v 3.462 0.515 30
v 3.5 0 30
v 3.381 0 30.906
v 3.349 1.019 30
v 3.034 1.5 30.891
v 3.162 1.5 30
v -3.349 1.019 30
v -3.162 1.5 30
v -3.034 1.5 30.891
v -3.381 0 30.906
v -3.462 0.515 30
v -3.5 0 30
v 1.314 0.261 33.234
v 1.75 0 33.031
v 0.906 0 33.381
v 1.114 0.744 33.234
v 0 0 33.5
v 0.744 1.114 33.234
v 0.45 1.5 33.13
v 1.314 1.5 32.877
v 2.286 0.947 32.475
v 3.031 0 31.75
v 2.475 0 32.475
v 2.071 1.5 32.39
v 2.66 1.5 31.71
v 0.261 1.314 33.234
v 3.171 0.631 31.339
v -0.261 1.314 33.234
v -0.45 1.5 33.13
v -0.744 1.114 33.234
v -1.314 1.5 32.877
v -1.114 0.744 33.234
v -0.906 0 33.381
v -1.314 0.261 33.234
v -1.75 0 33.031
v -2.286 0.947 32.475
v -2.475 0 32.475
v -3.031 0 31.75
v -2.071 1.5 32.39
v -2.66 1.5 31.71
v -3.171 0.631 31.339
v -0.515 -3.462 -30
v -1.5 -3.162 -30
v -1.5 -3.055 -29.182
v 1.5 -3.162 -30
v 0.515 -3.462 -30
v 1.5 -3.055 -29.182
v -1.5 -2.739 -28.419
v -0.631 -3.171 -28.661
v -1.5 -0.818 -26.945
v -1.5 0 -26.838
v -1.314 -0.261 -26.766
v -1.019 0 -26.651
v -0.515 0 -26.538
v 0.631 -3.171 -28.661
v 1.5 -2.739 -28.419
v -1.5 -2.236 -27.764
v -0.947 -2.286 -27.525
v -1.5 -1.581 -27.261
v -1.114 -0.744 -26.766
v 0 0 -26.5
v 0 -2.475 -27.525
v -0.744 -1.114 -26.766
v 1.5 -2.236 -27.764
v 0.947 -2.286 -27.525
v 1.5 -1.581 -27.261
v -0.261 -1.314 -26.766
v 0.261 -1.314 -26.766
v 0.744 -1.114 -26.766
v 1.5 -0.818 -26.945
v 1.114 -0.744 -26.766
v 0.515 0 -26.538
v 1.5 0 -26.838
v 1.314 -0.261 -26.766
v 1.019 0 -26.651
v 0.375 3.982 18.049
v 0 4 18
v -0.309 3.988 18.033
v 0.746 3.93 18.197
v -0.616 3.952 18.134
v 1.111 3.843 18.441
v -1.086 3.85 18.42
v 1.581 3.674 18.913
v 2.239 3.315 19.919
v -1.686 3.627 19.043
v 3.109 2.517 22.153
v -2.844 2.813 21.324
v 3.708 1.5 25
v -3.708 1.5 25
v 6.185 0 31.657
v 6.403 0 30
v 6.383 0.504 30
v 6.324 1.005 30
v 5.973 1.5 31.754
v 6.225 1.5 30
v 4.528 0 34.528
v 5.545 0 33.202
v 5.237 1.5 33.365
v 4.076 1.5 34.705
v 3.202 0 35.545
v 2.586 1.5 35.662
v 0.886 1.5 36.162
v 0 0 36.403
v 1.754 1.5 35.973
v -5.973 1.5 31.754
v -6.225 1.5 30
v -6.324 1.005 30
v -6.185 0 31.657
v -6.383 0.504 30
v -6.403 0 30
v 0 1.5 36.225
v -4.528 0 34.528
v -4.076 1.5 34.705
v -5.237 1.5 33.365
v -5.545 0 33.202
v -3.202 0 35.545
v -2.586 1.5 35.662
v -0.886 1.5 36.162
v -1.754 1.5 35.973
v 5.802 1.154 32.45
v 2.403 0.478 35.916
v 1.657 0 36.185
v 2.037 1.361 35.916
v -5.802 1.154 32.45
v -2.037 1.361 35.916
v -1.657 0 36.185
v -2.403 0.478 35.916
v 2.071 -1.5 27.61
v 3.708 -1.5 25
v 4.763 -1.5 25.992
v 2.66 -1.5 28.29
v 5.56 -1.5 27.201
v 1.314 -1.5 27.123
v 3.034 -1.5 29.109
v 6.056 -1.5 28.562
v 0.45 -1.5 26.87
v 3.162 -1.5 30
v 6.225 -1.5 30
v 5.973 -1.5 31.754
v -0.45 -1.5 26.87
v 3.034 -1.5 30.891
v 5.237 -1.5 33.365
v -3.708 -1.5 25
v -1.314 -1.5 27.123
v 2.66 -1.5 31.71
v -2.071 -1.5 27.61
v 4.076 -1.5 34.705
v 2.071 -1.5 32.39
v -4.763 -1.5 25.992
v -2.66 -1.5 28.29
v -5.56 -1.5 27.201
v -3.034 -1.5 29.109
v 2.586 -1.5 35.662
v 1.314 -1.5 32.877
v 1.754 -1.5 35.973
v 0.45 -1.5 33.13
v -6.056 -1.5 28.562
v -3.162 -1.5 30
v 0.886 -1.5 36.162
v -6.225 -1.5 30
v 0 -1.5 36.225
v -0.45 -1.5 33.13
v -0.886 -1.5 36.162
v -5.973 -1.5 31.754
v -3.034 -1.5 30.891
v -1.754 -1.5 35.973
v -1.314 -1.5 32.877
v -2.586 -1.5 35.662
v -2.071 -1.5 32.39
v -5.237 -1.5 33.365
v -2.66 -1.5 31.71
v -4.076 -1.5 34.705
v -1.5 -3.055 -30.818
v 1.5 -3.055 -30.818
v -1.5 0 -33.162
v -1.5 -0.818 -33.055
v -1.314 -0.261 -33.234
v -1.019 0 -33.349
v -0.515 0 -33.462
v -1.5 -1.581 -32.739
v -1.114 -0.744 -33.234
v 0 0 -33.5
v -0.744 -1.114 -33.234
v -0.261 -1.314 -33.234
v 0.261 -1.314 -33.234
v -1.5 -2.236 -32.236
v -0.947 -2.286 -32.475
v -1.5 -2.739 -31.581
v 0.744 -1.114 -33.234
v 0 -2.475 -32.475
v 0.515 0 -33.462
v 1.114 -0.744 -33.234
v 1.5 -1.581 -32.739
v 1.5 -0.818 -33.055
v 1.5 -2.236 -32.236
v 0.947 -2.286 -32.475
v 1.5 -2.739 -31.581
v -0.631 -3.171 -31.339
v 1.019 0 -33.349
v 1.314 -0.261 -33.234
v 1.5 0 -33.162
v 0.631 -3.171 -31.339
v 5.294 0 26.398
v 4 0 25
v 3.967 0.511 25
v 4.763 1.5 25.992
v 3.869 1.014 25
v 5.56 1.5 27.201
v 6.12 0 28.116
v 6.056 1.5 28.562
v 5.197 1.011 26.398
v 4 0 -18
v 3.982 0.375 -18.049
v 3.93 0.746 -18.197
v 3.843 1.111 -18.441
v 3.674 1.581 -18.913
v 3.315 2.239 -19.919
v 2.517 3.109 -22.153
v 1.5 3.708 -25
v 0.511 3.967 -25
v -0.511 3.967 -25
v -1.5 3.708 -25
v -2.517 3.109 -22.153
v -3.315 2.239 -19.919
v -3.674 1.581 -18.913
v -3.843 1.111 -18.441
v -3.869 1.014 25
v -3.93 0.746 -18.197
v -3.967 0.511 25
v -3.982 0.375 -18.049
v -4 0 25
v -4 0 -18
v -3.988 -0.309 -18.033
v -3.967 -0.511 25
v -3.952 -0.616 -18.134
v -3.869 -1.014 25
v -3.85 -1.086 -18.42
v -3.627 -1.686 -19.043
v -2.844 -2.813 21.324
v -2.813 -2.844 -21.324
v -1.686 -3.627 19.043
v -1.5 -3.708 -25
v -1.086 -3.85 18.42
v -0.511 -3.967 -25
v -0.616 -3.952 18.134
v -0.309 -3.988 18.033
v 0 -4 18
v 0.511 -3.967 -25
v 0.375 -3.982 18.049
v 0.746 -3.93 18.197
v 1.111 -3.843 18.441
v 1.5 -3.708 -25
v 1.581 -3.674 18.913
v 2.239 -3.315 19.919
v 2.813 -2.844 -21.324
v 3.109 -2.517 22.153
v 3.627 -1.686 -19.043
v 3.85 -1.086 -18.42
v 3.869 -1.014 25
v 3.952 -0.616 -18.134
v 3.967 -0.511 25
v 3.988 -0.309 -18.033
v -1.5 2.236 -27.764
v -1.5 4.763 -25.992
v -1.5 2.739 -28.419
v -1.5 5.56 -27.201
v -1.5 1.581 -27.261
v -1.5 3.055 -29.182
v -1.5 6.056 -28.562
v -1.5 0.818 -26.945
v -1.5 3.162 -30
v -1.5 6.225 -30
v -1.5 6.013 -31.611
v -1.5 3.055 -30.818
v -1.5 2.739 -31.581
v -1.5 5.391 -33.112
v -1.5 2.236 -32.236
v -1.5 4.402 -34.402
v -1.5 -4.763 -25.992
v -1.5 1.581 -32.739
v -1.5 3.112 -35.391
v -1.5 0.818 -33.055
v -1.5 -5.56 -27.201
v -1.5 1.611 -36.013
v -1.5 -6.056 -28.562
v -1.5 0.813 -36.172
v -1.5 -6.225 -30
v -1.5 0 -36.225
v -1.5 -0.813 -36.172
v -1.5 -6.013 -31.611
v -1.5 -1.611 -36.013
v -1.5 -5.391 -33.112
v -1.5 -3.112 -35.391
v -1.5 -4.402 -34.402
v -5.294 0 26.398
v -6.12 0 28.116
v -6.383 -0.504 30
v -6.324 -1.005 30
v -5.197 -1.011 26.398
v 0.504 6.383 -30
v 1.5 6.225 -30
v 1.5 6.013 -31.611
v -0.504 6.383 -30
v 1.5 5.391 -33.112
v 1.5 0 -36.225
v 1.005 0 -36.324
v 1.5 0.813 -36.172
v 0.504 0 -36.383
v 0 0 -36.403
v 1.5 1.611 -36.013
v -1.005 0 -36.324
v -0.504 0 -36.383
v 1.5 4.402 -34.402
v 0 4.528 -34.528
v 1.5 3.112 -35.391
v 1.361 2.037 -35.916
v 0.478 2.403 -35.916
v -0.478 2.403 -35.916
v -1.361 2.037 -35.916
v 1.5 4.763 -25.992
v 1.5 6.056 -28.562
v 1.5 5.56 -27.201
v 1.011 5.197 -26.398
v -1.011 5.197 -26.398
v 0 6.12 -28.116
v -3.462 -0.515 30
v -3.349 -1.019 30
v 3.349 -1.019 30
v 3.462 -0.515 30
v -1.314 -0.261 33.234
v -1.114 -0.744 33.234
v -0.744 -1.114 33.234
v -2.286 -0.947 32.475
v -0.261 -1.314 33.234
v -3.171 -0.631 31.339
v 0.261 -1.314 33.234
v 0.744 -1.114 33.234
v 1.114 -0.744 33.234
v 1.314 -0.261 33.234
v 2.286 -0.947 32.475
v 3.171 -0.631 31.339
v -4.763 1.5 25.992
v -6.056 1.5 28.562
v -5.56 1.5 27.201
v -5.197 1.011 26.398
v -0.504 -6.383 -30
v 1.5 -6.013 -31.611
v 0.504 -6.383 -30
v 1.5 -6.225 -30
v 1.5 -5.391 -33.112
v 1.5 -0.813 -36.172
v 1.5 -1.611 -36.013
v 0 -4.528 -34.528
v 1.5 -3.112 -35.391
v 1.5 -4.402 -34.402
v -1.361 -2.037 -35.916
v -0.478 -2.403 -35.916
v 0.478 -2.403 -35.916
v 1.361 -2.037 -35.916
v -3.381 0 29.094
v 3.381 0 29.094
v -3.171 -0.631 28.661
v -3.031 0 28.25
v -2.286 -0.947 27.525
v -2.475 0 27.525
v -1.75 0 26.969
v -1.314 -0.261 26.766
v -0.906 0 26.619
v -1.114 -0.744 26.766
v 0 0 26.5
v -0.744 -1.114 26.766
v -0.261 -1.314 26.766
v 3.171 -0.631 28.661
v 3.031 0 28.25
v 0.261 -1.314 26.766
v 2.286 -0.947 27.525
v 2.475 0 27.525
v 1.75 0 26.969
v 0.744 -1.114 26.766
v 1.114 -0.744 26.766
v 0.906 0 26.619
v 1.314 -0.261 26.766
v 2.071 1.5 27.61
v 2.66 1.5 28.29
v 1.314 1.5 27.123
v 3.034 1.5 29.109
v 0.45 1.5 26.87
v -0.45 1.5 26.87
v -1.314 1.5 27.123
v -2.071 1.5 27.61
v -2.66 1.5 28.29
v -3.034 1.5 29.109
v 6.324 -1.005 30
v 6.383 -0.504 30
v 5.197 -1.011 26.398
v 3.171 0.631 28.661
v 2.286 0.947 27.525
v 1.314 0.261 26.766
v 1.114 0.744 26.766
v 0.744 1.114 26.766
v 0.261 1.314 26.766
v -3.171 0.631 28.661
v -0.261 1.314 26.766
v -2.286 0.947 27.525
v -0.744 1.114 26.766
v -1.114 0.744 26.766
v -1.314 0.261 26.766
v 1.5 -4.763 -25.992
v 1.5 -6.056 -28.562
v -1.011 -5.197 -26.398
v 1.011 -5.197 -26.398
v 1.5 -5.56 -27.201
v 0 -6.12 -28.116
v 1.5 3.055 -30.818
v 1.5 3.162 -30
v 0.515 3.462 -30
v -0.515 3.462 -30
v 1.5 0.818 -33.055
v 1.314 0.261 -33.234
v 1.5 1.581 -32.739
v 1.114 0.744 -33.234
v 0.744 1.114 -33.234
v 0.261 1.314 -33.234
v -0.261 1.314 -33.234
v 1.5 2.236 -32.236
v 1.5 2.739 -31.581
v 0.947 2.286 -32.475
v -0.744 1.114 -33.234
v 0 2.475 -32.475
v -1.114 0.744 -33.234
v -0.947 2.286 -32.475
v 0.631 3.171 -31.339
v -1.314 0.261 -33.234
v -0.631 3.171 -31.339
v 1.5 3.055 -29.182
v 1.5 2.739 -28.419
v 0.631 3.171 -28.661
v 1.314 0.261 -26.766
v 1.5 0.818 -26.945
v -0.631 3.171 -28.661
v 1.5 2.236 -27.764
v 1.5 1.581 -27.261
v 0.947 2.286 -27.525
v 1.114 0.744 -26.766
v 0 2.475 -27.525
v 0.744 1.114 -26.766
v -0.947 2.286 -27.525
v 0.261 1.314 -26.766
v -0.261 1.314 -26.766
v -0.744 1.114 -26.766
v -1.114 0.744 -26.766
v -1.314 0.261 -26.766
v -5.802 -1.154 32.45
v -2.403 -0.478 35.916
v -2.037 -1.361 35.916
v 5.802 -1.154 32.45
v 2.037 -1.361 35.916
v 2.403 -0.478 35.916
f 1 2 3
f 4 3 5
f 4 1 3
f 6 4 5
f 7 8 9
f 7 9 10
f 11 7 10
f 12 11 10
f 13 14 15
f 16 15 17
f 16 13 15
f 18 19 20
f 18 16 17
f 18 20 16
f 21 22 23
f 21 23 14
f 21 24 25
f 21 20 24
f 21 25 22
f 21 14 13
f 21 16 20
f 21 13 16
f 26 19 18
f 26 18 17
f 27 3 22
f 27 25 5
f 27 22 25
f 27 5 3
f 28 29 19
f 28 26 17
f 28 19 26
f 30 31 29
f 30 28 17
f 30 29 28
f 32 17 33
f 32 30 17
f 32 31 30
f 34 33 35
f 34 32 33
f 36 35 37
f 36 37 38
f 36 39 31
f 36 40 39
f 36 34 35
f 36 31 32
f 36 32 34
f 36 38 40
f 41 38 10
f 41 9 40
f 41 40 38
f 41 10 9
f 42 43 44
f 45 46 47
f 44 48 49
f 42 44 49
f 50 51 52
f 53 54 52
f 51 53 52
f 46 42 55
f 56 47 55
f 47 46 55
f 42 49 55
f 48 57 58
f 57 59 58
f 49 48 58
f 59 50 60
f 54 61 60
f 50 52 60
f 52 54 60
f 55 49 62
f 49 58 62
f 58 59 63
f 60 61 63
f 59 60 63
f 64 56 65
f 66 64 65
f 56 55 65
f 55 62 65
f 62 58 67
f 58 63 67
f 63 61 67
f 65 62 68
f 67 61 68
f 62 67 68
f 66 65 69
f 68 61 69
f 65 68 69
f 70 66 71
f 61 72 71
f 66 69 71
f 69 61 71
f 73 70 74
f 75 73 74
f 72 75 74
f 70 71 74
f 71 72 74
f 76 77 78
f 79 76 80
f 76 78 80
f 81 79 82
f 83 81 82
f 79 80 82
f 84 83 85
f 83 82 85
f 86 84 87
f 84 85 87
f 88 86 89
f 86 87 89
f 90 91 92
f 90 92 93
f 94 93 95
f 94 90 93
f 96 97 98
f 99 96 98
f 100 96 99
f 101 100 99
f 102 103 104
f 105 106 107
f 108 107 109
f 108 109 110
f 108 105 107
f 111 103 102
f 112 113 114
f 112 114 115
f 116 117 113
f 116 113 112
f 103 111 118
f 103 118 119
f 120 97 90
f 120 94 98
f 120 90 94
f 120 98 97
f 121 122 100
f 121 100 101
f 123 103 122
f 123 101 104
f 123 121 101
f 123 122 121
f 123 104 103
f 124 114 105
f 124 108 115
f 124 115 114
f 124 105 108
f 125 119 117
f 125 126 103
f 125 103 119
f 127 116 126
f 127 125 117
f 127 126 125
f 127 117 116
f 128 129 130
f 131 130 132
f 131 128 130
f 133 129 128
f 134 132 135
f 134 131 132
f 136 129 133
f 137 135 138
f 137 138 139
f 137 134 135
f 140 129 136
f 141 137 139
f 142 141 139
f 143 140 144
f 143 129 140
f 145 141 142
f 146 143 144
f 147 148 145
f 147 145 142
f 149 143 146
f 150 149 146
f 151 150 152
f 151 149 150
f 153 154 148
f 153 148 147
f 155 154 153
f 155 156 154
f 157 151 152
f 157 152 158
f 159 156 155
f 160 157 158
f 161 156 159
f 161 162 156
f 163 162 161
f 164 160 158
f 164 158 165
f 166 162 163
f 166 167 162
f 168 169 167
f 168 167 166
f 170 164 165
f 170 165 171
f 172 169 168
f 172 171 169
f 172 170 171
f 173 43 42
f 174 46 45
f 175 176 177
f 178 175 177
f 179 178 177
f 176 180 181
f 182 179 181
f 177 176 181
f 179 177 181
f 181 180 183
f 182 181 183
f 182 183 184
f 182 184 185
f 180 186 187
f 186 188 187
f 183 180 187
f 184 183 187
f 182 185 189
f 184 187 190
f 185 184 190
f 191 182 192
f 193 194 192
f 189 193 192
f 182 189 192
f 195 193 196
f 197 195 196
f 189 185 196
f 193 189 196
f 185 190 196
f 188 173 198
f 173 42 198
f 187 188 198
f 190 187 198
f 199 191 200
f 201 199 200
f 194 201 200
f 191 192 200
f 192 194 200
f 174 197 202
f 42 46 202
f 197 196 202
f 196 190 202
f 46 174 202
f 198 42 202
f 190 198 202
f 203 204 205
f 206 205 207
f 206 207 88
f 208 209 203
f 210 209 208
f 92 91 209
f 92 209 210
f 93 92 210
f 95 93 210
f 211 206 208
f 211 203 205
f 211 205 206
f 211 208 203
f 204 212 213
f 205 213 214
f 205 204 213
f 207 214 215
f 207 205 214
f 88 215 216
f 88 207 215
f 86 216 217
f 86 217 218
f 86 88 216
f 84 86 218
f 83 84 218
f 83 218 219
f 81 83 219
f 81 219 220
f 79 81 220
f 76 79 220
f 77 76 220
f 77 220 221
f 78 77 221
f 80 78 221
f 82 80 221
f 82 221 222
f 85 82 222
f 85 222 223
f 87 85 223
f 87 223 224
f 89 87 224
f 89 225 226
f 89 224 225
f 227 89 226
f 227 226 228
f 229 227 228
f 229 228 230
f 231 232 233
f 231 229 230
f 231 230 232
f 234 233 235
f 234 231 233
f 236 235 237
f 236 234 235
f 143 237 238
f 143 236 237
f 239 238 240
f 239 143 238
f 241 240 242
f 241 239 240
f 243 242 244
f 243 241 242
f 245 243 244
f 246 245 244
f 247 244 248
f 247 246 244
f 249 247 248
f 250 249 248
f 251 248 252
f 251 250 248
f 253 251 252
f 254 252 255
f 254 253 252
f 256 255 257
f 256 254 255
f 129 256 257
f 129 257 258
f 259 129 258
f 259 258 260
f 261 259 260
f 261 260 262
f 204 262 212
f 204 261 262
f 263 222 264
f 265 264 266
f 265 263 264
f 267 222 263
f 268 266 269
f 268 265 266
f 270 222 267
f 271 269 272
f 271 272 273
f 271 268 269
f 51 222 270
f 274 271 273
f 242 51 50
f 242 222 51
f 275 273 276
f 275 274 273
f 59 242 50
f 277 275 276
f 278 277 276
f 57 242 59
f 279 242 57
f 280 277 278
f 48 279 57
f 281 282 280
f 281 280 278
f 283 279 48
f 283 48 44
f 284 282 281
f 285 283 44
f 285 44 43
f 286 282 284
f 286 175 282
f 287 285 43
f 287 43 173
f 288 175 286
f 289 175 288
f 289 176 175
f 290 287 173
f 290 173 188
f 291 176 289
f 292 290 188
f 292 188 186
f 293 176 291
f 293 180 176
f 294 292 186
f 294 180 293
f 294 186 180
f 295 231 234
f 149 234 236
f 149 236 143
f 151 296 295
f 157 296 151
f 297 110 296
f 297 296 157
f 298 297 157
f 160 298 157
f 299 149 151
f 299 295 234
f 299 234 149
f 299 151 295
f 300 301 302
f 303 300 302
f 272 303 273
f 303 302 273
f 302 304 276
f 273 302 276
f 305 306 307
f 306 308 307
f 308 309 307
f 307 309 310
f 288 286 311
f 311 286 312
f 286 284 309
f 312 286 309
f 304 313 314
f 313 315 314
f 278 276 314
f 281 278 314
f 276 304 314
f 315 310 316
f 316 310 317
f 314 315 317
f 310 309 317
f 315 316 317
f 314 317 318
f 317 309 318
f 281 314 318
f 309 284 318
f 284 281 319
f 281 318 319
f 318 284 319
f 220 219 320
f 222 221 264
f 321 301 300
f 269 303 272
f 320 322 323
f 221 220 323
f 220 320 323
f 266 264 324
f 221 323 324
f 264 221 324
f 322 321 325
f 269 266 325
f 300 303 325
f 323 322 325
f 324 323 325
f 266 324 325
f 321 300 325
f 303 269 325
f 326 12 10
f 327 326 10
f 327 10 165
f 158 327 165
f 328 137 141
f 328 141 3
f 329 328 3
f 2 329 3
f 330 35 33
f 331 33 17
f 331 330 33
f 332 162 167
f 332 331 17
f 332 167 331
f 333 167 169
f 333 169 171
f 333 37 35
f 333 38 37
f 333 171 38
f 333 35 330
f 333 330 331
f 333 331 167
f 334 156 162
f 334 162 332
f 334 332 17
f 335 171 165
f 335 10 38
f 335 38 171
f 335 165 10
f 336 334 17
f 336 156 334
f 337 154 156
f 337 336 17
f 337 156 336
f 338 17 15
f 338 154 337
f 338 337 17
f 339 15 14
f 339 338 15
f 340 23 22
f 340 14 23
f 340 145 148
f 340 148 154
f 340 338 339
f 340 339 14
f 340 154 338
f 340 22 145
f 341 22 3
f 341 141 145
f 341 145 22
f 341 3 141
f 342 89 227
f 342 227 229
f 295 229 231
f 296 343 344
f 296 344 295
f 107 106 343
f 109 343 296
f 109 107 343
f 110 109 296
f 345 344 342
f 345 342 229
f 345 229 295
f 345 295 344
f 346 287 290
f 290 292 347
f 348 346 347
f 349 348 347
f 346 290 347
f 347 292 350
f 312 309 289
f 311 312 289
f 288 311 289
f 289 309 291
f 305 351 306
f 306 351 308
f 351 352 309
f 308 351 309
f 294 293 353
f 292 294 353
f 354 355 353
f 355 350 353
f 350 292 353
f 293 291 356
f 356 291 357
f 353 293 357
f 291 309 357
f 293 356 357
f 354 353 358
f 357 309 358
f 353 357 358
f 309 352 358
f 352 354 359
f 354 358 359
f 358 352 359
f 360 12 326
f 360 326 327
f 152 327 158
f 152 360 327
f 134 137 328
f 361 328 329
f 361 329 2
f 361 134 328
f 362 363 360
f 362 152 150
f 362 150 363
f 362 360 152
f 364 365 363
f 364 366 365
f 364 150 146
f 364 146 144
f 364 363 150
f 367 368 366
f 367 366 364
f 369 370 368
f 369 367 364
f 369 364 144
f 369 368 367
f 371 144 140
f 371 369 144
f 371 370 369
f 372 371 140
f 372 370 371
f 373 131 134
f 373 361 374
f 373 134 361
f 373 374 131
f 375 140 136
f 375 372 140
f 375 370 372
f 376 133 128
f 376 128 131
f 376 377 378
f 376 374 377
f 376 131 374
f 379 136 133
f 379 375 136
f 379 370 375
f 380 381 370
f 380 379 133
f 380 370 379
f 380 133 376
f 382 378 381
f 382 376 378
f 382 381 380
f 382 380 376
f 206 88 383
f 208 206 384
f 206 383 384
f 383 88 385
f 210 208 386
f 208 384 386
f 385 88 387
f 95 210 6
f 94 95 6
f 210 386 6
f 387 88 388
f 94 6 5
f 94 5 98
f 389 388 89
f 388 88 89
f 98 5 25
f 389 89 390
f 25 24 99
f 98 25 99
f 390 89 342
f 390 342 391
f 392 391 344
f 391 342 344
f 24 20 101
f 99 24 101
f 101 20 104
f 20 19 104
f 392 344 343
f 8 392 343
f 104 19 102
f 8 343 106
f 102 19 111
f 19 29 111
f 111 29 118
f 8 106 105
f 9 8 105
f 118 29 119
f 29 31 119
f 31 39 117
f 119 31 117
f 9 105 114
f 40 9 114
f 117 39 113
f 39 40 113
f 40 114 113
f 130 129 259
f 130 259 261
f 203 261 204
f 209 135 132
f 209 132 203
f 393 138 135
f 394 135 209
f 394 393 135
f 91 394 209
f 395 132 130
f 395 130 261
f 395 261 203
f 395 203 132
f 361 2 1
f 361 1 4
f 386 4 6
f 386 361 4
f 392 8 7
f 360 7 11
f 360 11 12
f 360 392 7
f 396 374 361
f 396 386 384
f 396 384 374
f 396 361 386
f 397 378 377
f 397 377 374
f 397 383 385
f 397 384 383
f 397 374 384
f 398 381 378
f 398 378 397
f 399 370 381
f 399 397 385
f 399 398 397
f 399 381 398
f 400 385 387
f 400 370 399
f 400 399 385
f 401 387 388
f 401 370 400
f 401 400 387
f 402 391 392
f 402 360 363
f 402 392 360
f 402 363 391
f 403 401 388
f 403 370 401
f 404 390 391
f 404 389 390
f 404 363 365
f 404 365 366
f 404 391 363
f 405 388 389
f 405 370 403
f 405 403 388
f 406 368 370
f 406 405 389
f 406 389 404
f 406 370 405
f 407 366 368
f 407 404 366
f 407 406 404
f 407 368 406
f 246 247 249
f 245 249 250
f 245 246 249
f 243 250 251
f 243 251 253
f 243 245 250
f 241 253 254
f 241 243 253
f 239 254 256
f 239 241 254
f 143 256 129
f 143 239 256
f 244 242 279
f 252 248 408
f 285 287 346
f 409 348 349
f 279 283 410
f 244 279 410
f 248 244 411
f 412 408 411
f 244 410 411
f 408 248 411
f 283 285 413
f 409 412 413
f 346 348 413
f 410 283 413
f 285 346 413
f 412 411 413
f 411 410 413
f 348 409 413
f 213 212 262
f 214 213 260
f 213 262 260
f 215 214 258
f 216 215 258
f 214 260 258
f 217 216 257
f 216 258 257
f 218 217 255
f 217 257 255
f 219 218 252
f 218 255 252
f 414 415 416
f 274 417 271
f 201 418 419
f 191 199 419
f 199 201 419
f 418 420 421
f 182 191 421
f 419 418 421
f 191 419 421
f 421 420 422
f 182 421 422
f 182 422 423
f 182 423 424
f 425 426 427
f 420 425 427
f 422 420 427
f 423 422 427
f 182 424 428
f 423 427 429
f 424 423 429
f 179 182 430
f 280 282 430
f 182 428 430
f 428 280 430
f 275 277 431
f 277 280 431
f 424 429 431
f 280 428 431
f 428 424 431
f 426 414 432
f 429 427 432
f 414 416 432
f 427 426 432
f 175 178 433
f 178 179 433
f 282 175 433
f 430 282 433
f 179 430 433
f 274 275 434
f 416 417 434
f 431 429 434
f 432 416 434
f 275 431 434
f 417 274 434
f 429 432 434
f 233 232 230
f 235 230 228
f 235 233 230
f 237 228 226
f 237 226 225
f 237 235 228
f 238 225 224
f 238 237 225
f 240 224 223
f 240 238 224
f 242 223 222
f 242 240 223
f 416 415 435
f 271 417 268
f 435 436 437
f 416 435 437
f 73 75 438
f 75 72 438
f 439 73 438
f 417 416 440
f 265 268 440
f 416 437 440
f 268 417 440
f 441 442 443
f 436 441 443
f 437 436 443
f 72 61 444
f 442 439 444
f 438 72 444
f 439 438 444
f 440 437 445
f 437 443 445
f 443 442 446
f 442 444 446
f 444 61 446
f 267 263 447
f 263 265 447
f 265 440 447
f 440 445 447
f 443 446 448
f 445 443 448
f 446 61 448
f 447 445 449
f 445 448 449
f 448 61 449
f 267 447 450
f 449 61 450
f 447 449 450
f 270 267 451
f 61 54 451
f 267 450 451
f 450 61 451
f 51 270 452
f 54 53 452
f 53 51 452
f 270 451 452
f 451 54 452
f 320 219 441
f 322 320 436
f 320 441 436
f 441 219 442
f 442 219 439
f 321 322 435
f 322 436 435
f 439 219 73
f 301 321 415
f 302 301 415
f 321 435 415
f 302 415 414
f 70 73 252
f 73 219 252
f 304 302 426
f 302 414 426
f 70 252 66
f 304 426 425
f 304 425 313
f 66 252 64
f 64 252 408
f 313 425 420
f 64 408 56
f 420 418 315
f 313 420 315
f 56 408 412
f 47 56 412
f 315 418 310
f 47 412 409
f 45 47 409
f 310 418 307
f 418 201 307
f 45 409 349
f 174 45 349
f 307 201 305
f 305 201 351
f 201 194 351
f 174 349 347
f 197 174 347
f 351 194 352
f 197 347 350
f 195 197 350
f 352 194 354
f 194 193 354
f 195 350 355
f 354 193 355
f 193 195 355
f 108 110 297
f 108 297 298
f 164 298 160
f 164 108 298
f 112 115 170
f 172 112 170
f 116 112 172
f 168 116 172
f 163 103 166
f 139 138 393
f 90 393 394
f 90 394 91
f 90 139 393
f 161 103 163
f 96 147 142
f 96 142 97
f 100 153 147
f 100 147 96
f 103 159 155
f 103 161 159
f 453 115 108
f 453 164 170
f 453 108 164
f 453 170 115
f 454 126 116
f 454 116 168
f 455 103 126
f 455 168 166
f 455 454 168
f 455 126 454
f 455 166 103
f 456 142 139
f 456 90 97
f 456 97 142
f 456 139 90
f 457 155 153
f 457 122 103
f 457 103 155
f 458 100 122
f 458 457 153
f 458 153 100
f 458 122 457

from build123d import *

# Parameters (mm, degrees)
SKETCH_1_R               = 4
EXTRUDE_1_DEPTH          = 25
CUT_EXTRUDE_1_DEPTH      = 38.512497308
CUT_EXTRUDE_1_DEPTH_BACK = 38.512497308
CUT_EXTRUDE_2_DEPTH      = 38.512497308
CUT_EXTRUDE_2_DEPTH_BACK = 38.512497308


with BuildPart() as part:
    # 草图1 → 凸台-拉伸1 (new, symmetric)
    with BuildSketch(Plane.XY):
        Circle(SKETCH_1_R)
    extrude(amount=EXTRUDE_1_DEPTH, both=True)

    # 草图2 → 旋转2 (revolve)
    with BuildSketch(Plane(origin=(0, 0, 0), x_dir=(1, 0, 0), z_dir=(0, 1, 0))):
        with BuildLine():
            ThreePointArc((0, 23.596875763), (6.403124237, 30), (0, 36.403124237))
            Line((0, 36.403124237), (0, 33.5))
            ThreePointArc((0, 33.5), (3.5, 30), (0, 26.5))
            Line((0, 26.5), (0, 23.596875763))
        make_face()
        with BuildLine():
            Line((0, -33.5), (0, -36.403124237))
            ThreePointArc((0, -36.403124237), (6.403124237, -30), (0, -23.596875763))
            Line((0, -23.596875763), (0, -26.5))
            ThreePointArc((0, -26.5), (3.5, -30), (0, -33.5))
        make_face()
    revolve(axis=Axis((0, 0, -36.403124237), (0, 0, 1)))

    # 草图3 → 切除-拉伸1 (cut, two sides: drawn at the far end of the back side and taken through both)
    with BuildSketch(Plane(origin=(0, 0, 0), x_dir=(0, 0, -1), z_dir=(1, 0, 0)).offset(-CUT_EXTRUDE_1_DEPTH_BACK)):
        Polygon((-18, 4), (-25, 1.5), (-38, 1.5), (-38, 8), (-18, 8), align=None)
        Polygon((-18, -8), (-18, -4), (-25, -1.5), (-38, -1.5), (-38, -8), align=None)
    extrude(amount=CUT_EXTRUDE_1_DEPTH + CUT_EXTRUDE_1_DEPTH_BACK, mode=Mode.SUBTRACT)

    # 草图4 → 切除-拉伸2 (cut, two sides: drawn at the far end of the back side and taken through both)
    with BuildSketch(Plane(origin=(0, 0, 0), x_dir=(1, 0, 0), z_dir=(0, 1, 0)).offset(-CUT_EXTRUDE_2_DEPTH_BACK)):
        Polygon((4, 18), (1.5, 25), (1.5, 39), (8, 39), (8, 18), align=None)
        Polygon((-8, 18), (-4, 18), (-1.5, 25), (-1.5, 39), (-8, 39), align=None)
    extrude(amount=CUT_EXTRUDE_2_DEPTH + CUT_EXTRUDE_2_DEPTH_BACK, mode=Mode.SUBTRACT)


solid = part.part
